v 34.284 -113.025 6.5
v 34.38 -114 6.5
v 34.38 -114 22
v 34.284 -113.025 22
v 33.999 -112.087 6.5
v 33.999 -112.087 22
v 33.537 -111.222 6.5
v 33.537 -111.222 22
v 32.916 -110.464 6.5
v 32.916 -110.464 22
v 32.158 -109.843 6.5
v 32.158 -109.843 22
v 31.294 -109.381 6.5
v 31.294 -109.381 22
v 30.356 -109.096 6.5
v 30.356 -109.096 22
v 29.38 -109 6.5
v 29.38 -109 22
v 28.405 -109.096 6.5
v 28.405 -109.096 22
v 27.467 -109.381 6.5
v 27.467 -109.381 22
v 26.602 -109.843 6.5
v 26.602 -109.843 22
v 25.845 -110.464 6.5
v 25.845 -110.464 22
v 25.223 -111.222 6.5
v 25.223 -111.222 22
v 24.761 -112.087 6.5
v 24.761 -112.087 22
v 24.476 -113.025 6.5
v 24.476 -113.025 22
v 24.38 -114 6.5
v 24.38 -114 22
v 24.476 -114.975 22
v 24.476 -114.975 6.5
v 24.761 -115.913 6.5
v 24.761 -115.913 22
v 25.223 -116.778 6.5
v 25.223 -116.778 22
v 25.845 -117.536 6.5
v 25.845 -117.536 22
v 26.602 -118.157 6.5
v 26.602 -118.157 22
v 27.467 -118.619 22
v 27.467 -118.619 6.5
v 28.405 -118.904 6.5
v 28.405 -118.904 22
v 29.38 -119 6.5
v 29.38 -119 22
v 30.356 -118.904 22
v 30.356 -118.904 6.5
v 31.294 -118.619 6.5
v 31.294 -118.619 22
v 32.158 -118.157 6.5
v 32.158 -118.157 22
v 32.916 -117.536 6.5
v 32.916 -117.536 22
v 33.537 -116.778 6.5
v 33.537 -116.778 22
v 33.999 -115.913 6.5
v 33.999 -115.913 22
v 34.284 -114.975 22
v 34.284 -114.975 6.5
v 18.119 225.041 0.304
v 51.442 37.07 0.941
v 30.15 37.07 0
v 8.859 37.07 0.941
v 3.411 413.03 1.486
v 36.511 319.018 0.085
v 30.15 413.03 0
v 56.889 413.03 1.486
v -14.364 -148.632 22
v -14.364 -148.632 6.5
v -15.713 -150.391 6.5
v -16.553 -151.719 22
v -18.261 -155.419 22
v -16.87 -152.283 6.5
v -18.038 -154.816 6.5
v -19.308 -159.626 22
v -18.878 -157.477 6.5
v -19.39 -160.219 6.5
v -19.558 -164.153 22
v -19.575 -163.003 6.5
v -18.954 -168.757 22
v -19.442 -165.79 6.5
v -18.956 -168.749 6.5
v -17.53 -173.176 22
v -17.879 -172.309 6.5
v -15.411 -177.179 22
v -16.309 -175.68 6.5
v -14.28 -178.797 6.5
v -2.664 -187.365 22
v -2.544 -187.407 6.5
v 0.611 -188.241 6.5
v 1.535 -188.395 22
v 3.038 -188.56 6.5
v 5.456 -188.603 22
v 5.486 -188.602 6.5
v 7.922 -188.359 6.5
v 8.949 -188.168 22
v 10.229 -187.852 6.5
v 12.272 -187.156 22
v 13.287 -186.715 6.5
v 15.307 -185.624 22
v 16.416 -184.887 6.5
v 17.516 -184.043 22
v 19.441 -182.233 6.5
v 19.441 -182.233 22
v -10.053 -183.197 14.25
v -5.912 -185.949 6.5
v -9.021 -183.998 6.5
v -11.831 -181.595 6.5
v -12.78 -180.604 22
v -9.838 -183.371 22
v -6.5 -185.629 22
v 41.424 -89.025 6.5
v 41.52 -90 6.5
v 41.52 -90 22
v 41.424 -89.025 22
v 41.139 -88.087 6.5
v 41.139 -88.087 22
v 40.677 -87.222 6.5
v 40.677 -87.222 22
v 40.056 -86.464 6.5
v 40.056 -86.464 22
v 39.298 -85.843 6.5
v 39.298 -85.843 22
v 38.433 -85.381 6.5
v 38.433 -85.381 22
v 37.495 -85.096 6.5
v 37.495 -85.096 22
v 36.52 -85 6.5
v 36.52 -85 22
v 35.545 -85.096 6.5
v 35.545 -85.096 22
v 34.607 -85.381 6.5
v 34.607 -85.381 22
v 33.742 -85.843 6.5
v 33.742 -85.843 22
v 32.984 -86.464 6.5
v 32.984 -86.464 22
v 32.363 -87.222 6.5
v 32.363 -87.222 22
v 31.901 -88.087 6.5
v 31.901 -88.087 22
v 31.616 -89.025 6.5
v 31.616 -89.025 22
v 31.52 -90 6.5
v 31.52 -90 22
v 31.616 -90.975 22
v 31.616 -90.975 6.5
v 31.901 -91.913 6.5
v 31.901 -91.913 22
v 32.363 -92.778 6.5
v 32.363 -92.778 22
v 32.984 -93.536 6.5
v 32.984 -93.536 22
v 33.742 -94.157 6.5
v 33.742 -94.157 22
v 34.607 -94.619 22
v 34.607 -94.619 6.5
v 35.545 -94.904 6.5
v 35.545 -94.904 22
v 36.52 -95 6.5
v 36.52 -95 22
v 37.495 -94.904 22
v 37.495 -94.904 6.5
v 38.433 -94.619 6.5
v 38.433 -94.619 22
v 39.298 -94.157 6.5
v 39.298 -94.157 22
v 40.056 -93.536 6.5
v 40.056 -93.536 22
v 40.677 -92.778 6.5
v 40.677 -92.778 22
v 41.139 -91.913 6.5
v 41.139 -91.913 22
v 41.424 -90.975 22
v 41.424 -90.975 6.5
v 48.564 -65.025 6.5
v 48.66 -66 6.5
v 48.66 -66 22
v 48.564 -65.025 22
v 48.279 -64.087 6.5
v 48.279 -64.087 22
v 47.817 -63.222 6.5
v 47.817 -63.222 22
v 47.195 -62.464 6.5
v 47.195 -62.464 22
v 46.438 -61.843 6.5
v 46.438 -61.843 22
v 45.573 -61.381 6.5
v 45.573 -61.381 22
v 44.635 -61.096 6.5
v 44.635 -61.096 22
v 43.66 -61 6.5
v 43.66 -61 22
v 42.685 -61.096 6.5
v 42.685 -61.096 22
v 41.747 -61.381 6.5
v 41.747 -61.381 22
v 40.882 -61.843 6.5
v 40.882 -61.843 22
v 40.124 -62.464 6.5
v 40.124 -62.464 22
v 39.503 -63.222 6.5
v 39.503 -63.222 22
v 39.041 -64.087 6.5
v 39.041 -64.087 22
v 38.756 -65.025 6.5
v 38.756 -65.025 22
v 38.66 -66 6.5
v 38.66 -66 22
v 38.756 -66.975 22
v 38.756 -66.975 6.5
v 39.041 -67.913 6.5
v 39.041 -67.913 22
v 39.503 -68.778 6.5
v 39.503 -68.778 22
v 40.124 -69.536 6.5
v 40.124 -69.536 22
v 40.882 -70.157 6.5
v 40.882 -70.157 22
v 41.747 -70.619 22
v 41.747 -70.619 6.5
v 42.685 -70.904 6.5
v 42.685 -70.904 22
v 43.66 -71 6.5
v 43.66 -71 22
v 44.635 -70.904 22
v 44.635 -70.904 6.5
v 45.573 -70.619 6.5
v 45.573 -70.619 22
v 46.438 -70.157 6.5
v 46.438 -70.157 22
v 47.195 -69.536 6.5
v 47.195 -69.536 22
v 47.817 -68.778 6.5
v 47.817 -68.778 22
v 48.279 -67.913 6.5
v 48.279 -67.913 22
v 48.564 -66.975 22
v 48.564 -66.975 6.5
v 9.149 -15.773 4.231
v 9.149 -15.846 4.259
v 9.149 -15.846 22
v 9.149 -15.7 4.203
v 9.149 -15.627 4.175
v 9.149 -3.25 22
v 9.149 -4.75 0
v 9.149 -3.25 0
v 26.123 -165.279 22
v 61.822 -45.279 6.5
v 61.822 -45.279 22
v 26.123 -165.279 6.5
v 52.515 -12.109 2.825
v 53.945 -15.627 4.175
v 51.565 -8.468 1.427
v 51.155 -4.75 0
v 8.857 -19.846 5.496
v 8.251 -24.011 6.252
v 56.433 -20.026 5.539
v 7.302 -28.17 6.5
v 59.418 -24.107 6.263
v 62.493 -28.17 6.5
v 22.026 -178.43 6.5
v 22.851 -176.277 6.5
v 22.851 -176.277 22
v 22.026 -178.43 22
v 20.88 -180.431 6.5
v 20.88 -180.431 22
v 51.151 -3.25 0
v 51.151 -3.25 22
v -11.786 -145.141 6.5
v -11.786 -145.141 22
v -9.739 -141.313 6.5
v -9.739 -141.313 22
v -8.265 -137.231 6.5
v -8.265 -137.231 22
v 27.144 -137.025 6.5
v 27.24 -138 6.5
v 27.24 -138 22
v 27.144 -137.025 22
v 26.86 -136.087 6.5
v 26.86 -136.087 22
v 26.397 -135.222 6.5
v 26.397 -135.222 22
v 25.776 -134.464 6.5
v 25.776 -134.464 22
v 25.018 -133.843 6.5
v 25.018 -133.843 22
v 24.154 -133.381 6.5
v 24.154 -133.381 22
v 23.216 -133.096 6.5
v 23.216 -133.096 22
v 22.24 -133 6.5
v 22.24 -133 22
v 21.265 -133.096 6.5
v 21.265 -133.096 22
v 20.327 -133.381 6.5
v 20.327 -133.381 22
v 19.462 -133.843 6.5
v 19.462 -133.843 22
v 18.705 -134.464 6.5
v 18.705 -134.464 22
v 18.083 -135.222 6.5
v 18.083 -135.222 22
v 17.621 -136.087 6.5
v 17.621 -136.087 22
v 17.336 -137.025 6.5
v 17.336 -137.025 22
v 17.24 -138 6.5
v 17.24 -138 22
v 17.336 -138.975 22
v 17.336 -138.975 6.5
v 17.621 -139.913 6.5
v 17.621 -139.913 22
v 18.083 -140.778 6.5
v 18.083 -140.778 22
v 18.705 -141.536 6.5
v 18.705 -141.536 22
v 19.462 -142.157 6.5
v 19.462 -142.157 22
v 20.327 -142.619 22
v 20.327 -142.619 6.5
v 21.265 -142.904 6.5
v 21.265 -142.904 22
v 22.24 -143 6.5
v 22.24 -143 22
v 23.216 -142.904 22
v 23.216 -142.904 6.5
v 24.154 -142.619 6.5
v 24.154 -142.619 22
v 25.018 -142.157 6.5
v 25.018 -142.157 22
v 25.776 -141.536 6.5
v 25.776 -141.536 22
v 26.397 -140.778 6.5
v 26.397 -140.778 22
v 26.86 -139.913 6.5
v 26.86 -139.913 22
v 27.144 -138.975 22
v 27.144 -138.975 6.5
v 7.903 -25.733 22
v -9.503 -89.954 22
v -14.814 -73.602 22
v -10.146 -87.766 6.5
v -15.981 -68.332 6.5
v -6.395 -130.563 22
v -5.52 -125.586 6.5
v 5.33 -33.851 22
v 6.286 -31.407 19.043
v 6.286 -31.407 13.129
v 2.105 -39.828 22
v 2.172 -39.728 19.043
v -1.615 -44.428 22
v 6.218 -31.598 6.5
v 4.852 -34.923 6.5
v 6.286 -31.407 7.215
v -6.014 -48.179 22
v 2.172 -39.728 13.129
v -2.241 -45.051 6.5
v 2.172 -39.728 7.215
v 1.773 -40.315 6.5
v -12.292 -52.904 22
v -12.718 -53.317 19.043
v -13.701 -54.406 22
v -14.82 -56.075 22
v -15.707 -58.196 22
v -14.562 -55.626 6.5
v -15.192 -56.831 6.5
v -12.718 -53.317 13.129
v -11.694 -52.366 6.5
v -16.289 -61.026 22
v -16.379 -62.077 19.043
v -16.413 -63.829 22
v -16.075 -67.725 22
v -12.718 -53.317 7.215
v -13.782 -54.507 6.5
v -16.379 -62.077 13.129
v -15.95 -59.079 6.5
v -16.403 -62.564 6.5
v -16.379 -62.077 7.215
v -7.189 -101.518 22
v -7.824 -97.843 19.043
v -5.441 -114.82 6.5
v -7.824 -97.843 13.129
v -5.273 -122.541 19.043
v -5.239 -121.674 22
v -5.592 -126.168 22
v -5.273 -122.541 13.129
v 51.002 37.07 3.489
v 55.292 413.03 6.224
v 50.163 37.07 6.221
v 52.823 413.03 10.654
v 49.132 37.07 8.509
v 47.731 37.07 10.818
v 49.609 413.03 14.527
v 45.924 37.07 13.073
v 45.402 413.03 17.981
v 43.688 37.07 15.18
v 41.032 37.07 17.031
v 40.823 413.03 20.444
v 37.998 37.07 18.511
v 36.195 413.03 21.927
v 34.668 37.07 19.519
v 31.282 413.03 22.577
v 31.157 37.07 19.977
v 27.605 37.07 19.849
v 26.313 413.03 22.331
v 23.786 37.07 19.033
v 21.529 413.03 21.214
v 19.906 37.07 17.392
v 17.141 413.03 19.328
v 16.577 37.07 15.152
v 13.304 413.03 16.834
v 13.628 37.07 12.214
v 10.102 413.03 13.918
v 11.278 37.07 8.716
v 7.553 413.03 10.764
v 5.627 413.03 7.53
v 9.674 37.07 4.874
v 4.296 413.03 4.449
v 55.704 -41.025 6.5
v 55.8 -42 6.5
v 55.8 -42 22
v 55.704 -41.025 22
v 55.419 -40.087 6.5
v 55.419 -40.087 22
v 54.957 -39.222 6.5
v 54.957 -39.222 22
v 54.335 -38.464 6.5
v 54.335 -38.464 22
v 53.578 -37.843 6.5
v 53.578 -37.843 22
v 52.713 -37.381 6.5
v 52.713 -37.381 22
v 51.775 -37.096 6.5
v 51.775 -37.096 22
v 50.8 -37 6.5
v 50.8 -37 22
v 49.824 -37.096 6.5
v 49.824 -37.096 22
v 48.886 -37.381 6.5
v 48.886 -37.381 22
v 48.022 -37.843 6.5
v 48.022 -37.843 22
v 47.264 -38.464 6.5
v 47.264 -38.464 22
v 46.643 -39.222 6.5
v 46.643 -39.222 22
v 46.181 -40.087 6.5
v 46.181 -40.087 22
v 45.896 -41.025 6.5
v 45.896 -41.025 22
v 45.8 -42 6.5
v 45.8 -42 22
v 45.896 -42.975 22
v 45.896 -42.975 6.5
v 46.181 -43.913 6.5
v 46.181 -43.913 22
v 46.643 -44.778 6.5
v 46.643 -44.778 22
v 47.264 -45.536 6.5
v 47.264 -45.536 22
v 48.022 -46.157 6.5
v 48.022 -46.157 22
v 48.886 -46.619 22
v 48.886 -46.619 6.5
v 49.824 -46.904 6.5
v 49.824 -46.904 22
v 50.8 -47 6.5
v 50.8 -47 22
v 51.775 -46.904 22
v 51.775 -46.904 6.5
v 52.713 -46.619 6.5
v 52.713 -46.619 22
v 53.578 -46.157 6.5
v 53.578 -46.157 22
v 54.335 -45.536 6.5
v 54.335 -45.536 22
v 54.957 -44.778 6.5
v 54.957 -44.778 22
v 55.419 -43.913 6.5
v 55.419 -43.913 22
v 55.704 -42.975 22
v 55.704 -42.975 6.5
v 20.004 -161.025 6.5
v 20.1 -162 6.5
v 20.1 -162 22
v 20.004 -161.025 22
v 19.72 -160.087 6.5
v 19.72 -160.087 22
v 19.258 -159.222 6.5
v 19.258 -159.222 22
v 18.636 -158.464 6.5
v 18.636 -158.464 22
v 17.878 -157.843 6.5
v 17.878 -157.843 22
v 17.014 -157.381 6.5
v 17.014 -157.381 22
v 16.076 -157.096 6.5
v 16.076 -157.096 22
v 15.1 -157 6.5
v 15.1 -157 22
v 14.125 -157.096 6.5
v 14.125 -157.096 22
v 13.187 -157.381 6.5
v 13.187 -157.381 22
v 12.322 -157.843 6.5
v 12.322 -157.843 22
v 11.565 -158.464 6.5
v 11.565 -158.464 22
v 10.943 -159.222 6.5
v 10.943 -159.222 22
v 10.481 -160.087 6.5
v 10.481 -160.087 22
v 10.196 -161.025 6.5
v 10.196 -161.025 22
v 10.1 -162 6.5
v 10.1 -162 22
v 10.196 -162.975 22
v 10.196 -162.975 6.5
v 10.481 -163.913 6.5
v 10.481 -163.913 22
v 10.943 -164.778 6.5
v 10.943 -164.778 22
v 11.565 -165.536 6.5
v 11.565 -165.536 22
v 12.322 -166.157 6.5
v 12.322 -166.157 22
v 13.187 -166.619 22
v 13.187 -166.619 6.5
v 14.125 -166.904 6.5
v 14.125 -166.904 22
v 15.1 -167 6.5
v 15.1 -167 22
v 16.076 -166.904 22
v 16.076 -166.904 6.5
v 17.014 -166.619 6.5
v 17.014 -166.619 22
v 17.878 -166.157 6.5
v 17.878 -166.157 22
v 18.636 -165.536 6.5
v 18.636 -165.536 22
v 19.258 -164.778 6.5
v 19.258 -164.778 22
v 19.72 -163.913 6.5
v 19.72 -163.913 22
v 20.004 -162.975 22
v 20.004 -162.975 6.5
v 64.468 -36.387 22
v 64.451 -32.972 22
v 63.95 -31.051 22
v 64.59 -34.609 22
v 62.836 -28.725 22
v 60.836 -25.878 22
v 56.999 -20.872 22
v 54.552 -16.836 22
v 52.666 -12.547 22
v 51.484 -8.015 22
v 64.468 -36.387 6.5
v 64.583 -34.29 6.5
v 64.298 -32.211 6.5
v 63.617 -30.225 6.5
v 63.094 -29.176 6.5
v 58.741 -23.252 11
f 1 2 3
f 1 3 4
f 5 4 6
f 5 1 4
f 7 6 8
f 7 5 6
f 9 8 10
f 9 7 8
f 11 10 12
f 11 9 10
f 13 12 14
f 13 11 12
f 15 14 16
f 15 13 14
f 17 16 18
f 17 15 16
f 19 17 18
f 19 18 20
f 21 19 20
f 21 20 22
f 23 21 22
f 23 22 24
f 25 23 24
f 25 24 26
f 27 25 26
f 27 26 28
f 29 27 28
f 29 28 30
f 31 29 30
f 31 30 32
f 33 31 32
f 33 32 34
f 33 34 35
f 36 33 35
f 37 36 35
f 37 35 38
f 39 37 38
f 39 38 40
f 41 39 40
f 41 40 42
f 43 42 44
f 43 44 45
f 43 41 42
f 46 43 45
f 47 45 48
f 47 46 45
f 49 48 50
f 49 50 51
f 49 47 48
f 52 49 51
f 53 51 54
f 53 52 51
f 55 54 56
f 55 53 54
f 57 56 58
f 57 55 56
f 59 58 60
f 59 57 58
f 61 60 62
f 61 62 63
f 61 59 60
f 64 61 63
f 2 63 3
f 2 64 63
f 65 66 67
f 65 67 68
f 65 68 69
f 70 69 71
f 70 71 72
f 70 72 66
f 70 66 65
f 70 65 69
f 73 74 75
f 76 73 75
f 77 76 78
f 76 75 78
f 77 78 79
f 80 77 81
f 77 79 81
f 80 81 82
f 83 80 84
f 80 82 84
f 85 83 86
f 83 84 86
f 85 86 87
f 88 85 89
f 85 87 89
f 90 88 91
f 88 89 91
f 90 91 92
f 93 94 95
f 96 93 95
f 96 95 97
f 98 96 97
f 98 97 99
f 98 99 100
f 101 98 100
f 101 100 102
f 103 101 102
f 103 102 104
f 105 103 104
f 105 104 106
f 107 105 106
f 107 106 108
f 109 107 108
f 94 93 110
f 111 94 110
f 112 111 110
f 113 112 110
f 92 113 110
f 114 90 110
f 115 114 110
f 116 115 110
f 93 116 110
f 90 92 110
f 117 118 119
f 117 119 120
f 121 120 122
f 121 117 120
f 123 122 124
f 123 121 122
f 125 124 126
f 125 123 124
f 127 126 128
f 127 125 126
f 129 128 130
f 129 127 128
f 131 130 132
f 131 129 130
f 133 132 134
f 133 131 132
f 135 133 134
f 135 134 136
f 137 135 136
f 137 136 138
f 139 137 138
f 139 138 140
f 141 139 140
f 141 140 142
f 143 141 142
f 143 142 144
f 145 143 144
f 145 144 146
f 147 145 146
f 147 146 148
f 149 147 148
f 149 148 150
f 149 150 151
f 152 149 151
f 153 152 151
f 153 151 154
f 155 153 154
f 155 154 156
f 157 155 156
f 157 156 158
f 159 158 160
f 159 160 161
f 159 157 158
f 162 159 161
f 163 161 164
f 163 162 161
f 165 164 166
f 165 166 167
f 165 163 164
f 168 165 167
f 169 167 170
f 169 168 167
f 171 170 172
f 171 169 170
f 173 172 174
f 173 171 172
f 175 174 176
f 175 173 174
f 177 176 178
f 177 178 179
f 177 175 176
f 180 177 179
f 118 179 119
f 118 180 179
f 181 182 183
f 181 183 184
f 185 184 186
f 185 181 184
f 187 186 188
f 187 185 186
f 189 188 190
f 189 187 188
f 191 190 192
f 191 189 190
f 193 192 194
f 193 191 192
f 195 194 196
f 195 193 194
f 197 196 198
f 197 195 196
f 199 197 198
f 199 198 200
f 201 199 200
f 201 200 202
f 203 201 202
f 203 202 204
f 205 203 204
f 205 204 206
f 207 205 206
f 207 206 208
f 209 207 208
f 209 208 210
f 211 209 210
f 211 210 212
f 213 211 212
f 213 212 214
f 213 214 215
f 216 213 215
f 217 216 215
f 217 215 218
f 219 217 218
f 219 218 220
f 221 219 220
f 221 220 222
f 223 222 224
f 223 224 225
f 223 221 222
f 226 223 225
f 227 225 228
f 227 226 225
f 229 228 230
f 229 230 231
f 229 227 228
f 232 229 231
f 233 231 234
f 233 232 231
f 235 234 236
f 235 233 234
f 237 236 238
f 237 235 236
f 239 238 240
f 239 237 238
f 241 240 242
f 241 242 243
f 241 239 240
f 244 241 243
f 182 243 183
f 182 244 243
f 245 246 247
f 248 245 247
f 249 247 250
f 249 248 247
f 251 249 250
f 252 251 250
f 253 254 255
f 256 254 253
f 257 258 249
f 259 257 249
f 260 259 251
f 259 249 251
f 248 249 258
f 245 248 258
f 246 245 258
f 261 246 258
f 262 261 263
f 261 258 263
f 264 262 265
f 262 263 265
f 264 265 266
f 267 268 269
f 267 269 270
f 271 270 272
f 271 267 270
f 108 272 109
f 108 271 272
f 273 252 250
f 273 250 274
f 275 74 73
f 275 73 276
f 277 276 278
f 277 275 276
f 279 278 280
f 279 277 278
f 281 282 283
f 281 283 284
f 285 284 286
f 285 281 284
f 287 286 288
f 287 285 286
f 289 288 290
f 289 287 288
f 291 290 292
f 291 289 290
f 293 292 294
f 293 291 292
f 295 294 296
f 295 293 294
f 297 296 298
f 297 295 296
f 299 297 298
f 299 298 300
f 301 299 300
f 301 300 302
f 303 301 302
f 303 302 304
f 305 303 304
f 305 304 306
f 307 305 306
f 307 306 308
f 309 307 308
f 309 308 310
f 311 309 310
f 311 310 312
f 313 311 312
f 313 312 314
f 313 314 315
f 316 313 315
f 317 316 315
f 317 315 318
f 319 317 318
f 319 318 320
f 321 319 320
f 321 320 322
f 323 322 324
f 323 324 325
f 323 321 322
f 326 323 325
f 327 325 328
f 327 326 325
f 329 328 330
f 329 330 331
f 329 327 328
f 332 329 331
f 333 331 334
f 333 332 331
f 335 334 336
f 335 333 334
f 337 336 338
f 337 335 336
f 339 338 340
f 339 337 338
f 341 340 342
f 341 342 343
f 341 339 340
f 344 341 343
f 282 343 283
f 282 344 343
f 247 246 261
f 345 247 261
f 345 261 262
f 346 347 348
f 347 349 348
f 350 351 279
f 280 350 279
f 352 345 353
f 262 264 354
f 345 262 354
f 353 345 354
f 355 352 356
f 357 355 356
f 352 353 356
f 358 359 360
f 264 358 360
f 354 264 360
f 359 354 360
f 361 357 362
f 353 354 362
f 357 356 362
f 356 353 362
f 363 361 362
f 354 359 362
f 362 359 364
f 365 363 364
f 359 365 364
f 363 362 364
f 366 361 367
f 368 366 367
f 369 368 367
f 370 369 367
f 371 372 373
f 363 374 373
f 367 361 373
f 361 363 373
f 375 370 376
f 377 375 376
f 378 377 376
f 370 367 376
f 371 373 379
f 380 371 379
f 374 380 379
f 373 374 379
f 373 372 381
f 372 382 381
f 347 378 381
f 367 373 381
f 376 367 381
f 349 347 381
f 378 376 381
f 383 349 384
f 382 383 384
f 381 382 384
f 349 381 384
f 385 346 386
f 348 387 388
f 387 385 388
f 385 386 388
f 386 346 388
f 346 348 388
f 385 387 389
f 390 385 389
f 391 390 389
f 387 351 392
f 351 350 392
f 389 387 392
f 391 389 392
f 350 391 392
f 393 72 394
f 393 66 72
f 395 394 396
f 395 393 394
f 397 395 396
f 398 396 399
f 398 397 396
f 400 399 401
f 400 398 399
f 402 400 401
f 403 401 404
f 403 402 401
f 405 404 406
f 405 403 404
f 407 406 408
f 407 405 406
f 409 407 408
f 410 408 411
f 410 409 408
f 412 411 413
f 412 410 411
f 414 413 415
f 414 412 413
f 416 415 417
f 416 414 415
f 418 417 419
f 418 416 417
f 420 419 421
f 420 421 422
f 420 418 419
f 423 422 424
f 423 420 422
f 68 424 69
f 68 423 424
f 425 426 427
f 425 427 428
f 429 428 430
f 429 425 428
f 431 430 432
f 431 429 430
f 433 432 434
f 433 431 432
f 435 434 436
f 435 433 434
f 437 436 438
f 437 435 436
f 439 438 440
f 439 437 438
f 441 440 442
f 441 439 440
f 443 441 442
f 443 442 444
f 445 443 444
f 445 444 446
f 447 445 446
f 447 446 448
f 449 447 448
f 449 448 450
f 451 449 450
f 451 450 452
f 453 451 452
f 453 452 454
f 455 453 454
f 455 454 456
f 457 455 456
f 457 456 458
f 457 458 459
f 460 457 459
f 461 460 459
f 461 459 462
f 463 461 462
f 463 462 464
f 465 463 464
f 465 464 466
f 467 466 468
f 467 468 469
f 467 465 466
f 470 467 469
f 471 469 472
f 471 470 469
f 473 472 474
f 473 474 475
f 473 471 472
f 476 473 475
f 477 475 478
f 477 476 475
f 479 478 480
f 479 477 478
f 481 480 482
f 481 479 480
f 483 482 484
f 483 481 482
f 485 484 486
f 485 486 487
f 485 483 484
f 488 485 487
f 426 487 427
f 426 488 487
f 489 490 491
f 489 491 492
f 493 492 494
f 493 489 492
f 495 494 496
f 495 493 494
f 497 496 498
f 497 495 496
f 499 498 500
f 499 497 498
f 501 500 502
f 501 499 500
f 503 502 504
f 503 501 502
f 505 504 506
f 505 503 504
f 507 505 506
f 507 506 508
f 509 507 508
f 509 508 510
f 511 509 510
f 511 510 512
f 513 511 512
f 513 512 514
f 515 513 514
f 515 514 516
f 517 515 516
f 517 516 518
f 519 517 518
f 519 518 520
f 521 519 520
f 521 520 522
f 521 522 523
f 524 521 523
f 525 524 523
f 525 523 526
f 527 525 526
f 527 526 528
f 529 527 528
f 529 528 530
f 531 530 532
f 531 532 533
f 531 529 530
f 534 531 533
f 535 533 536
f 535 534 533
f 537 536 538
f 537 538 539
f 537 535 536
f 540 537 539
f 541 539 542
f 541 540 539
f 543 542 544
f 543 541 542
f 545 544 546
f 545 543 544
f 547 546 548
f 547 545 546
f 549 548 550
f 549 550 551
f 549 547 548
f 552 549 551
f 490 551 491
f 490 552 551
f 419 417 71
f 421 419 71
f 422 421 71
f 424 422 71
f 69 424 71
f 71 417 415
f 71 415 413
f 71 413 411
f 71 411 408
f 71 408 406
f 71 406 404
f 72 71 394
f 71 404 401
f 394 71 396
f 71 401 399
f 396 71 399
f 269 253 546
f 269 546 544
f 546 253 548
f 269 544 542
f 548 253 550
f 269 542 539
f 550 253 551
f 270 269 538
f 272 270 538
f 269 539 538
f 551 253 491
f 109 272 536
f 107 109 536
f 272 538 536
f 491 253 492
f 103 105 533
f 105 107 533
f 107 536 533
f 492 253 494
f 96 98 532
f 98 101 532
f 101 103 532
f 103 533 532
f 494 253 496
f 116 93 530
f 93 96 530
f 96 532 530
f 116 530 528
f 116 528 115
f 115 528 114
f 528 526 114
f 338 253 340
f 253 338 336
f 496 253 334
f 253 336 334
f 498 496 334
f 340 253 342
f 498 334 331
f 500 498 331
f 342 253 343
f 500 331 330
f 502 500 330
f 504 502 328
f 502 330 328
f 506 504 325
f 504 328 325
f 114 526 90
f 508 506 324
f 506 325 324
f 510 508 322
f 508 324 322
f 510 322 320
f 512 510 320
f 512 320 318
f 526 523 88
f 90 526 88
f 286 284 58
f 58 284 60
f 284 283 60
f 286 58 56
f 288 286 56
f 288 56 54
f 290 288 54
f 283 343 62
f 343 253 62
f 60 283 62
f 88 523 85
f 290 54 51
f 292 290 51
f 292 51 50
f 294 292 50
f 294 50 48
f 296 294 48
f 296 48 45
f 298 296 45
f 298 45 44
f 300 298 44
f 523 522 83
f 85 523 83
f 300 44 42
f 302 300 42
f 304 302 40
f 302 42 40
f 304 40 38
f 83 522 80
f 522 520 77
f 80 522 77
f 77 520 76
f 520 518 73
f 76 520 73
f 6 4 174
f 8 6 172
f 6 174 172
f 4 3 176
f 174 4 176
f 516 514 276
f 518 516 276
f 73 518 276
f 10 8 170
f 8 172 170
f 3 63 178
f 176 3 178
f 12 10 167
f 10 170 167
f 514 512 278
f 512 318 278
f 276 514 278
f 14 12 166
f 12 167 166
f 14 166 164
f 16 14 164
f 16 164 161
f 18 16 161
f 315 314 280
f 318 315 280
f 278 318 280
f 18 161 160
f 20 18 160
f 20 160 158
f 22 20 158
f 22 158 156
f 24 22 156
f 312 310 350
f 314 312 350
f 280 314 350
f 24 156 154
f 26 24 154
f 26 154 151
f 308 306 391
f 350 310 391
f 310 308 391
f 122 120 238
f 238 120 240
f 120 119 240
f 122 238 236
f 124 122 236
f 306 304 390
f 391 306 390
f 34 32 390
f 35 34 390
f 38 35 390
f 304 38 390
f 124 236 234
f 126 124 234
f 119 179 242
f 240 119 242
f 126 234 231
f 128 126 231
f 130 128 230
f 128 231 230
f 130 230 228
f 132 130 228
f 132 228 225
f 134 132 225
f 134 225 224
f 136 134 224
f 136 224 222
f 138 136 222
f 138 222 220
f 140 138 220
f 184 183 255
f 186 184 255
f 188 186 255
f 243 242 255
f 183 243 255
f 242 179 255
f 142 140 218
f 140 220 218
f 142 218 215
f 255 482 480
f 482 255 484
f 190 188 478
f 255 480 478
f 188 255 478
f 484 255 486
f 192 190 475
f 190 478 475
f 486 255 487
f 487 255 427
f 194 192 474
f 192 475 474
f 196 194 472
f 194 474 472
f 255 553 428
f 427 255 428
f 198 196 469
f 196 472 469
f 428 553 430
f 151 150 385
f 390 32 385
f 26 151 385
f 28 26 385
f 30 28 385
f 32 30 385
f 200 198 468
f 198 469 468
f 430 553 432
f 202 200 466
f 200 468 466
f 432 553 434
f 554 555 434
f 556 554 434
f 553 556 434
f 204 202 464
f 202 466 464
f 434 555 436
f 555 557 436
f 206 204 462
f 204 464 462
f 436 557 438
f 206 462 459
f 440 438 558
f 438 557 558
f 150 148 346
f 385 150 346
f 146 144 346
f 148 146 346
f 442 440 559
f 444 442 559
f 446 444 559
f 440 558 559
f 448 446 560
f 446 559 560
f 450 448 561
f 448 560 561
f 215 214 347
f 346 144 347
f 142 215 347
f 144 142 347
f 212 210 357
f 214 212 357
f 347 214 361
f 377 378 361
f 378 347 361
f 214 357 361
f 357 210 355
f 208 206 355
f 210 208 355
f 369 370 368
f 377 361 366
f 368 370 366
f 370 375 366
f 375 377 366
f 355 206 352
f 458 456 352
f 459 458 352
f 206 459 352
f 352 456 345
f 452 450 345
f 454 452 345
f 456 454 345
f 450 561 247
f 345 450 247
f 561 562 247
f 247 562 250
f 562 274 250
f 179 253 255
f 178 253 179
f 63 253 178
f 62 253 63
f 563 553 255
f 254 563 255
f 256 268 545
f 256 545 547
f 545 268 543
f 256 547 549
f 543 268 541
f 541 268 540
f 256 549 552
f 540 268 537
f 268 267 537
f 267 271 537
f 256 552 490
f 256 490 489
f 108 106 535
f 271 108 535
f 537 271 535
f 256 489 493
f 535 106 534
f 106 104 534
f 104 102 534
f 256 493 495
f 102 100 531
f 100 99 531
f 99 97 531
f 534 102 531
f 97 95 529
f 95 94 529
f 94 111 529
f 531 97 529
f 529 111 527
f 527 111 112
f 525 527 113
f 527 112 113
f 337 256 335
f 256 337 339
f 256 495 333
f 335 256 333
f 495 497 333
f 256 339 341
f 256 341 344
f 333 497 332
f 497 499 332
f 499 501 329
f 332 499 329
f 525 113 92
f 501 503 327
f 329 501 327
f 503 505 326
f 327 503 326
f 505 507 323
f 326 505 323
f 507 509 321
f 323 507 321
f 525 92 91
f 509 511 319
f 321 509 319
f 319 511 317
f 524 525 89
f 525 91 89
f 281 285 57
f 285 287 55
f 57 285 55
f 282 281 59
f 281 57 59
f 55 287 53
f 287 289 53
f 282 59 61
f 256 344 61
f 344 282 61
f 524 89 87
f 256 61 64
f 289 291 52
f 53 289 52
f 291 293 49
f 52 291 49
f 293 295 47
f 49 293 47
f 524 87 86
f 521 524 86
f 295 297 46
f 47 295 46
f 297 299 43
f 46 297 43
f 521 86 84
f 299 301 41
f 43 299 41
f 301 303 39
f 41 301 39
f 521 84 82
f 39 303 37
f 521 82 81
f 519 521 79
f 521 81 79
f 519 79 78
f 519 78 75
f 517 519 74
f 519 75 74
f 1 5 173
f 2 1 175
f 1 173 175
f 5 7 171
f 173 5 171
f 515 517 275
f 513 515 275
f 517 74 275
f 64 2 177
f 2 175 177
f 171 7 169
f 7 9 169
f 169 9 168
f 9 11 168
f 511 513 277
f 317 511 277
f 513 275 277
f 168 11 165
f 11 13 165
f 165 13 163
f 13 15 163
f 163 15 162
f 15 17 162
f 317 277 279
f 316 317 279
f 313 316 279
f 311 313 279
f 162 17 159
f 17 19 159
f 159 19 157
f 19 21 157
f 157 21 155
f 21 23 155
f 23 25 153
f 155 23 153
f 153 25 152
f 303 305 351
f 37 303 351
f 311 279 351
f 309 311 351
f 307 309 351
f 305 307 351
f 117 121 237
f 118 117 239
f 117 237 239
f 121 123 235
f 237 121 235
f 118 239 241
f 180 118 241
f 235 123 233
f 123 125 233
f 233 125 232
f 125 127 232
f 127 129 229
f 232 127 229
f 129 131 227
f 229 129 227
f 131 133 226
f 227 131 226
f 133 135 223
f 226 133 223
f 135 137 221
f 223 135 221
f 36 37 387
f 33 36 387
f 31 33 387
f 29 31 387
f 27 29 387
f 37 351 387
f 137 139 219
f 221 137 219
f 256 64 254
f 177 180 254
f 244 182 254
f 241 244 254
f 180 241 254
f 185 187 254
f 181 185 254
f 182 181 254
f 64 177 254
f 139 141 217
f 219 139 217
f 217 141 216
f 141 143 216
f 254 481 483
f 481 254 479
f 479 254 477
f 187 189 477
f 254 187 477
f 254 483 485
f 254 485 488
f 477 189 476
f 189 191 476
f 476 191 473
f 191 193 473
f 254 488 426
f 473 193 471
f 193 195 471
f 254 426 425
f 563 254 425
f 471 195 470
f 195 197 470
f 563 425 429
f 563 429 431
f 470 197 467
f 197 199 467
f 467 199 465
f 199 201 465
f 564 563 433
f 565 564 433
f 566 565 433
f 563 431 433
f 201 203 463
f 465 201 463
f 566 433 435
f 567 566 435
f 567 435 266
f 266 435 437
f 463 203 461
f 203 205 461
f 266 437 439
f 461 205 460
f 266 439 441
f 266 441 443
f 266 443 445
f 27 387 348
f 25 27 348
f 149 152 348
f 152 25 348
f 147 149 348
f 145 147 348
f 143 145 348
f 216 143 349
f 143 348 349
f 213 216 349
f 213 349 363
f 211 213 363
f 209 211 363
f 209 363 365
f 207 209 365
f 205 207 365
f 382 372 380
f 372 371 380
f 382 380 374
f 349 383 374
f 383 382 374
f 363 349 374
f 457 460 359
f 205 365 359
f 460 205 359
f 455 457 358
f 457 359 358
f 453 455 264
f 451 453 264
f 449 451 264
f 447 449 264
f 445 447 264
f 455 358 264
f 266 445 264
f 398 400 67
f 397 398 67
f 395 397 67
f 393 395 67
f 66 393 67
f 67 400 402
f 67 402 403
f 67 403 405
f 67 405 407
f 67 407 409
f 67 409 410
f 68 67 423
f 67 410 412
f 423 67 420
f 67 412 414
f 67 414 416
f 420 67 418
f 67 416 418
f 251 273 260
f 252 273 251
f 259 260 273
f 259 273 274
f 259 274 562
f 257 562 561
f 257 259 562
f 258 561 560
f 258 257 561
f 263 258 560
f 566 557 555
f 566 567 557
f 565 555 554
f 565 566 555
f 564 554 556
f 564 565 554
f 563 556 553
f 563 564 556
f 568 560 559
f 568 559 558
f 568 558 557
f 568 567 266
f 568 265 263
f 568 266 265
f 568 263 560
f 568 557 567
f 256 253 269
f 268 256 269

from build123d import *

# Parameters (mm, degrees)
SKETCH7_R               = 5
BOSS_EXTRUDE1_DEPTH     = 22
CUT_EXTRUDE1_DEPTH      = 89
CUT_EXTRUDE1_DEPTH_BACK = 47
FILLET1_R               = 35
FILLET2_START           = 6
FILLET2_DEPTH           = 17


with BuildPart() as part:
    # Sketch4 for Loft1 → Loft1 section 0
    with BuildSketch(Plane(origin=(0, 413.03, 0), x_dir=(1, 0, 0), z_dir=(0, 1, 0))):
        with BuildLine():
            # circular arc as an exact rational Bezier (weights 1, cos(half-angle), 1)
            Bezier((3.411173818, -1.486067363), (30.150054, 1.495276154), (56.888934182, -1.486067363), weights=[1, 0.993841412, 1])
            Bezier((56.888934182, -1.486067363), (30.150054, -113.662589607), (3.411173818, -1.486067363), weights=[1, 0.231868224, 1])
        make_face()
    # Sketch2 for Loft1 → Loft1 section 1
    with BuildSketch(Plane(origin=(0, 37.07, 0), x_dir=(1, 0, 0), z_dir=(0, 1, 0))):
        with BuildLine():
            Bezier((51.441561571, -0.941181345), (30.150054, 0.944866761), (8.858546429, -0.941181345), weights=[1, 0.996099539, 1])
            Bezier((8.858546429, -0.941181345), (30.150054, -192.779980086), (51.441561571, -0.941181345), weights=[1, 0.110309138, 1])
        make_face()
    loft()


with BuildPart() as body_2:
    # Sketch7 → Boss-Extrude1 (new body)
    with BuildSketch(Plane.XY):
        with BuildLine():
            Line((61.822469128, -45.279185569), (26.122769128, -165.279185569))
            Line((26.122769128, -165.279185569), (22.169953883, -178.566071157))
            add(Edge.make_bspline(
                [(-14.363516024, -148.632447047), (-29.983708853, -166.866419634), (-10.052911221, -183.196678053), (9.877886411, -199.526936472), (22.169953883, -178.566071157)],
                knots=[3.45985968, 3.45985968, 3.45985968, 5.114245342, 5.114245342, 6.768631003, 6.768631003, 6.768631003], degree=2, weights=[1, 0.676944597, 1, 0.676944597, 1]))
            ThreePointArc((-14.363516024, -148.632447047), (-10.69288163, -143.264136434), (-8.26535198, -137.230943622))
            add(Edge.make_bspline(
                [(9.14908, -15.846186083), (8.813826518, -24.400453935), (5.670137635, -42.713883785), (-21.244829391, -56.657182906), (-10.241238044, -86.8971503), (-8.604581344, -92.570992516), (-3.490987251, -123.919790761), (-6.829553094, -132.1214282), (-8.26535198, -137.230943622)],
                knots=[0, 0, 0, 0, 0.241122102, 0.315889977, 0.476811467, 0.625347755, 0.735303781, 0.929974714, 0.929974714, 0.929974714, 0.929974714], degree=3))
            Line((9.14908, -15.846186083), (9.14908, -3.25))
            Line((9.14908, -3.25), (51.151028, -3.25))
            add(Edge.make_bspline(
                [(51.151028, -3.25), (50.937550111, -10.767323465), (56.483762161, -22.000731952), (65.296265302, -30.566236086), (64.46789676, -36.386917125)],
                knots=[0, 0, 0, 0, 0.598162067, 1, 1, 1, 1], degree=3))
            Line((64.46789676, -36.386917125), (61.822469128, -45.279185569))
        make_face()
        with Locations((50.799904, -42)):
            Circle(SKETCH7_R, mode=Mode.SUBTRACT)
        with Locations((43.659964, -66)):
            Circle(SKETCH7_R, mode=Mode.SUBTRACT)
        with Locations((36.520024, -90)):
            Circle(SKETCH7_R, mode=Mode.SUBTRACT)
        with Locations((29.380084, -114)):
            Circle(SKETCH7_R, mode=Mode.SUBTRACT)
        with Locations((22.240144, -138)):
            Circle(SKETCH7_R, mode=Mode.SUBTRACT)
        with Locations((15.100204, -162)):
            Circle(SKETCH7_R, mode=Mode.SUBTRACT)
    extrude(amount=BOSS_EXTRUDE1_DEPTH)

    # Sketch9 → Cut-Extrude1 (cut, two sides: drawn at the far end of the back side and taken through both)
    with BuildSketch(Plane(origin=(0, 0, 0), x_dir=(0, 0, -1), z_dir=(1, 0, 0)).offset(-CUT_EXTRUDE1_DEPTH_BACK)):
        Polygon((0, -4.75), (0, -188.619559547), (-6.5, -188.619559547), (-6.5, -21.683078921), align=None)
    extrude(amount=CUT_EXTRUDE1_DEPTH + CUT_EXTRUDE1_DEPTH_BACK, mode=Mode.SUBTRACT)

    # Fillet1
    fillet1_edges = [body_2.edges().sort_by_distance(p)[0] for p in [
        (33.098498215, -21.683078921, 6.5),
    ]]
    fillet(fillet1_edges, radius=FILLET1_R)

    # Fillet2: read off the stored shape, not the designer's step
    # Fillet2 outline → Fillet2 (cut)
    with BuildSketch(Plane.XY.offset(FILLET2_START)):
        with BuildLine():
            Line((22.169953883, -178.566071157), (22.850975257, -176.276904444))
            ThreePointArc((22.850975257, -176.276904444), (21.491301478, -179.452388519), (19.441266868, -182.232634909))
            add(Edge.make_bspline(
                [(19.441266868, -182.232634909), (20.998606375, -180.56349408), (22.169953883, -178.566071157)],
                knots=[6.545874557, 6.545874557, 6.545874557, 6.768631003, 6.768631003, 6.768631003], degree=2, weights=[0.92471745, 0.956501876, 1]))
        make_face()
    extrude(amount=FILLET2_DEPTH, mode=Mode.SUBTRACT)


solid = Compound([part.part, body_2.part])
